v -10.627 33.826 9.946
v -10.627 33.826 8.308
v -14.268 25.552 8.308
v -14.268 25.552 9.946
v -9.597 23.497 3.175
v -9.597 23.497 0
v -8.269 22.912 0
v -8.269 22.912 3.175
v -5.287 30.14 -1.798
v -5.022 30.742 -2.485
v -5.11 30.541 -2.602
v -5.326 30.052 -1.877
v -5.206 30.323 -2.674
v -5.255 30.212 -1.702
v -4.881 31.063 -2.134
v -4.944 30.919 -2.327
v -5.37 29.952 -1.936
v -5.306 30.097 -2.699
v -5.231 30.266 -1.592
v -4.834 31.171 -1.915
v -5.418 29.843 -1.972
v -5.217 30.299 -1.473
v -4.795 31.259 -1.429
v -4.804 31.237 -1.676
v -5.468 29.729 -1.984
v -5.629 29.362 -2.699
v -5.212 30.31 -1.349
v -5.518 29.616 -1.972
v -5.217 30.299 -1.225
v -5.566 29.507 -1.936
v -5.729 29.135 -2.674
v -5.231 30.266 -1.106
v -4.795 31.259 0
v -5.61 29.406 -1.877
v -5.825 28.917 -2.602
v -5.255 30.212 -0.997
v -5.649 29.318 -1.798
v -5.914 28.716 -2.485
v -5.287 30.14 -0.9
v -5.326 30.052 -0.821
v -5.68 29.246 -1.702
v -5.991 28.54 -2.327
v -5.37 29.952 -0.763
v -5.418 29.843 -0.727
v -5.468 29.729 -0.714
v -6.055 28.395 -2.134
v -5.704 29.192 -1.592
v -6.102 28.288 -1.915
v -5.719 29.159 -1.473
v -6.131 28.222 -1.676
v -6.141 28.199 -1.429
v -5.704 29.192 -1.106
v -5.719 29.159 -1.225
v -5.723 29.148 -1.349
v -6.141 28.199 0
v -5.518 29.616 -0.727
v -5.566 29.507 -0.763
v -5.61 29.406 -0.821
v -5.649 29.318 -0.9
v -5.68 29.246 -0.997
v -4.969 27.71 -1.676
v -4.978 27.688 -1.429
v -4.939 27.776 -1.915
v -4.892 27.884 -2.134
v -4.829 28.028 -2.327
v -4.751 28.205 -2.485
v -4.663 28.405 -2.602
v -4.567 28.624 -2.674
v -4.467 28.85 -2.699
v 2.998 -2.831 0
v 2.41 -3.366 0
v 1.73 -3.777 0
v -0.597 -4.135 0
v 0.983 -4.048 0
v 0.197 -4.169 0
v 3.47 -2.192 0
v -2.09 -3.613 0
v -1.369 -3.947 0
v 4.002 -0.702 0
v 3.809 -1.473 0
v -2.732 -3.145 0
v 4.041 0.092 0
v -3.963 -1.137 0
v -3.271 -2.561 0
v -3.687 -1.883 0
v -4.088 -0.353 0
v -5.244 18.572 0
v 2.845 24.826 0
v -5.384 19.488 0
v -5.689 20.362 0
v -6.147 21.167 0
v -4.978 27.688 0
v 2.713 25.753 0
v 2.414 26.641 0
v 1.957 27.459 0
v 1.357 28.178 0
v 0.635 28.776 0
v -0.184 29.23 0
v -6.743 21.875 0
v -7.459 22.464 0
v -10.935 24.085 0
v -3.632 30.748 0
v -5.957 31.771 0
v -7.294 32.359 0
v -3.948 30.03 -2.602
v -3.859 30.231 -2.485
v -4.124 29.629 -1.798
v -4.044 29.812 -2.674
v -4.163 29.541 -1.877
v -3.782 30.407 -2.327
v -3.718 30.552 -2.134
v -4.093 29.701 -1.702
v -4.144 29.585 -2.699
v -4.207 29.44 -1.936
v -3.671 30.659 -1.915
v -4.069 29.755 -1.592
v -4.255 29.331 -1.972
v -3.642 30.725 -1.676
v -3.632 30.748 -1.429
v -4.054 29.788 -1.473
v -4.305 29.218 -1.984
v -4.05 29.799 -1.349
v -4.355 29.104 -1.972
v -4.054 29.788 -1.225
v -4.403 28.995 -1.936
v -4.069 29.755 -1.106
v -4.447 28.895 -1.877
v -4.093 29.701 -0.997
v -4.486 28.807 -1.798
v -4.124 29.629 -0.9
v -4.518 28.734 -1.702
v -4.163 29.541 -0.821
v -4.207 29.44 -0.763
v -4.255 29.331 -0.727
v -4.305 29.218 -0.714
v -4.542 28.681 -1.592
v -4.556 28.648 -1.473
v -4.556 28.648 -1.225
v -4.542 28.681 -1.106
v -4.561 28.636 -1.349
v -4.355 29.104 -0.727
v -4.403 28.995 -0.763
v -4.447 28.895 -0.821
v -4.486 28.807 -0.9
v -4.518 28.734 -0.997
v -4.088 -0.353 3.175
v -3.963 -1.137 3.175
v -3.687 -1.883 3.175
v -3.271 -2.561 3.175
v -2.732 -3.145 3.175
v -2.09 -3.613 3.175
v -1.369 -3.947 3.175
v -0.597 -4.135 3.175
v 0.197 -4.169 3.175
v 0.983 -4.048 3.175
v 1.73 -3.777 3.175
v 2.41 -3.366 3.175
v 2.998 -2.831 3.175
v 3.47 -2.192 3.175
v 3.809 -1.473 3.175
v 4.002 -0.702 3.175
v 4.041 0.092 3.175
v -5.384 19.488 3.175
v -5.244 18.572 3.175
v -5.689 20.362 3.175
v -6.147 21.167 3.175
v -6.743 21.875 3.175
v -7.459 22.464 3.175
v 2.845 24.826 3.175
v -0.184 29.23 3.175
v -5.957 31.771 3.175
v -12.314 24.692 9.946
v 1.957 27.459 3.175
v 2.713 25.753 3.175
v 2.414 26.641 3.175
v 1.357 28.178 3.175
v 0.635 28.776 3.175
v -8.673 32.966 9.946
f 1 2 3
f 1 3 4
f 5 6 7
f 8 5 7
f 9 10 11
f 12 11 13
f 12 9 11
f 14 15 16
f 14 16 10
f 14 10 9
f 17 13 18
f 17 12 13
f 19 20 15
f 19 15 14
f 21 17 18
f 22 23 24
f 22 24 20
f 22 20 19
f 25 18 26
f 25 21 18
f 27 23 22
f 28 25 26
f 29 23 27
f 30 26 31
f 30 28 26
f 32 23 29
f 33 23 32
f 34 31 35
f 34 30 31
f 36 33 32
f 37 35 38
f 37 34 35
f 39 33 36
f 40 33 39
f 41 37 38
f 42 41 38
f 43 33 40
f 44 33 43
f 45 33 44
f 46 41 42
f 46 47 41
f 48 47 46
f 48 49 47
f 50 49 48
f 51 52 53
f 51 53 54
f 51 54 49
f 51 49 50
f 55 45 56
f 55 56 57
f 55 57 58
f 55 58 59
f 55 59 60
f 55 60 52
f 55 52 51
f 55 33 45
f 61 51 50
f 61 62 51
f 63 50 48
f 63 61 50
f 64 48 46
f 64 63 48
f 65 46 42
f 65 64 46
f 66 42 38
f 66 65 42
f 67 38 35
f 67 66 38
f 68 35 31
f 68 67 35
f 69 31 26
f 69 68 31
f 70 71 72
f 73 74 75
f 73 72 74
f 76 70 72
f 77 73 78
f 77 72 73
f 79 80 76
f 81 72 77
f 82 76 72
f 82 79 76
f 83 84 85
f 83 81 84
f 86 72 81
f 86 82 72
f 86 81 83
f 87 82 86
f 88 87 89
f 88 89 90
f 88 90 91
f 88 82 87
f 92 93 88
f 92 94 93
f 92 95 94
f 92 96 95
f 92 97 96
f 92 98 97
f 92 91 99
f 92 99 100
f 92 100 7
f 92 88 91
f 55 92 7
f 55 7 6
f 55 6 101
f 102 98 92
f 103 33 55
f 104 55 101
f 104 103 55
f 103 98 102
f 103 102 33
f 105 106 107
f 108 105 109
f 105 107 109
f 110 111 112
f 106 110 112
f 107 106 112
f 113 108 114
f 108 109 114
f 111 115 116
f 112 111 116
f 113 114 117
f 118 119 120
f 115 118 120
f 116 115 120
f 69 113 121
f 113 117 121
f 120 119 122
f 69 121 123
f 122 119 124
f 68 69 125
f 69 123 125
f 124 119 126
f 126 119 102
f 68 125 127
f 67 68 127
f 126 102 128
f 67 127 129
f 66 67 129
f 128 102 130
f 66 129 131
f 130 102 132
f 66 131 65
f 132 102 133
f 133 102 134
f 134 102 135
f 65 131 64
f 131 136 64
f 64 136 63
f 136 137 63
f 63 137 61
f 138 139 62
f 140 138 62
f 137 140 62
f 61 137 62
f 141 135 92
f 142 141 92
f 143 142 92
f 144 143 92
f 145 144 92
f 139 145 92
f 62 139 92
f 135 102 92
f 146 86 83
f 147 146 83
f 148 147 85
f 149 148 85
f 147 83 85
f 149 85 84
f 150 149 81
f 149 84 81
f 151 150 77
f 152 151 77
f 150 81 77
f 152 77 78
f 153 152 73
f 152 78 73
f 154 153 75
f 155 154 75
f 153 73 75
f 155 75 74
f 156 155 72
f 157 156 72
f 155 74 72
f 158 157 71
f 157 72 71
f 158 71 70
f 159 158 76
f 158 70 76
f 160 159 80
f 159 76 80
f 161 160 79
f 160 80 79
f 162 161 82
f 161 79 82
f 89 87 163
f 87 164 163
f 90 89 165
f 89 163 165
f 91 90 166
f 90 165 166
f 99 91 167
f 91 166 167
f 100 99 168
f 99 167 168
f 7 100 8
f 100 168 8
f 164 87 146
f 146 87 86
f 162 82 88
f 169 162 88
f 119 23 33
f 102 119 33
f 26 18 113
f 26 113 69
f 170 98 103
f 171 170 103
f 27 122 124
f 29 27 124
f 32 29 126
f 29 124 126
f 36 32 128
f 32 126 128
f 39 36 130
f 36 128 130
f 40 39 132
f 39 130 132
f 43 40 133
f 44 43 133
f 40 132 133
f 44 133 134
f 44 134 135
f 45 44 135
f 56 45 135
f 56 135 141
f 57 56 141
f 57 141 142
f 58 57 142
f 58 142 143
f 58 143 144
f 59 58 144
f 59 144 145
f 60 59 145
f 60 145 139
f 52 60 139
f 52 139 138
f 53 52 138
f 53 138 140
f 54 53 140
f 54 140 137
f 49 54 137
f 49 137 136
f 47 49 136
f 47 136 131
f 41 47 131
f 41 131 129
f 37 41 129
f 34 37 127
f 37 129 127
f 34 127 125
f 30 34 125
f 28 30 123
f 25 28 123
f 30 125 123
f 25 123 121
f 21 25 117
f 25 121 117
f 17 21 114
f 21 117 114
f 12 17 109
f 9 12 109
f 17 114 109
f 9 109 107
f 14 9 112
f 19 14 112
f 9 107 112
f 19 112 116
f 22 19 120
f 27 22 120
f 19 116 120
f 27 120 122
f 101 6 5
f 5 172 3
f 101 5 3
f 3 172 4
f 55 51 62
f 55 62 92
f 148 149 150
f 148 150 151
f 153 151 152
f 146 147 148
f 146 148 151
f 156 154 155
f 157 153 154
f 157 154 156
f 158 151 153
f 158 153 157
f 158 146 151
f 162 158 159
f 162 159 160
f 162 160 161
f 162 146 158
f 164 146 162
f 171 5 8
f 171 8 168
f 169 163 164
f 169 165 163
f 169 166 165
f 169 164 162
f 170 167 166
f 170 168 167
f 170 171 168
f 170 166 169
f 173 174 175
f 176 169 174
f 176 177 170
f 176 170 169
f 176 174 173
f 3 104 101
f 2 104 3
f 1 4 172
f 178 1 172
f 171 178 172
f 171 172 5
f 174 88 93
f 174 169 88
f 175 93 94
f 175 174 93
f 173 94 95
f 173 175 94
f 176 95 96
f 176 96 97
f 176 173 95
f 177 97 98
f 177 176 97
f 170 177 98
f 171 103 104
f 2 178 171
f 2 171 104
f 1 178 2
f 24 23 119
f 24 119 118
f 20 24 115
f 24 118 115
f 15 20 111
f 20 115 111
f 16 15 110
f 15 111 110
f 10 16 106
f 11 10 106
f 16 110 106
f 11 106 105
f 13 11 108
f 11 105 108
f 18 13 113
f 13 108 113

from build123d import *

# Parameters (mm, degrees)
F1_DEPTH  = 3.175
F2_R      = 5.08
F3_R      = 5.08
F5_W      = 3.3427421004
F5_H      = 2.6986296289
F6_DEPTH  = 1.27
F7_R      = 1.27
F8_D      = 1.27
F10_DEPTH = 9.0390737111


with BuildPart() as f1:
    # F0 (on Top) → F1 (new body)
    with BuildSketch(Plane.XY):
        with BuildLine():
            Line((-5.9569855221, 31.7706279457), (-9.597370401, 23.4970282763))
            Line((-9.597370401, 23.4970282763), (-5.4328427644, 21.6646356006))
            Line((-5.4328427644, 21.6646356006), (-4.0882331564, -0.3526416028))
            ThreePointArc((-4.0882331564, -0.3526416028), (0.1973930726, -4.1691933566), (4.0409927589, 0.0921915022))
            Line((4.0409927589, 0.0921915022), (2.6926789221, 27.9647745192))
            Line((2.6926789221, 27.9647745192), (-5.9569855221, 31.7706279457))
        make_face()
    extrude(amount=F1_DEPTH)

    # F2
    f2_edges = [f1.edges().sort_by_distance(p)[0] for p in [
        (2.692679, 27.964775, 1.5875),
    ]]
    fillet(f2_edges, radius=F2_R)

    # F3
    f3_edges = [f1.edges().sort_by_distance(p)[0] for p in [
        (-5.432843, 21.664636, 1.5875),
    ]]
    fillet(f3_edges, radius=F3_R)

    # F5 (on offset) → F6 (join)
    with BuildSketch(Plane(origin=(-15.5400163929, 6.8376091371, 0), x_dir=(-0.4027387092, -0.9153149906, 0), z_dir=(-0.9153149906, 0.4027387092, 0))):
        with Locations((-25.0095250085, -1.3493148144)):
            Rectangle(F5_W, F5_H)
    extrude(amount=-F6_DEPTH)

    # F7
    f7_edges = [f1.edges().sort_by_distance(p)[0] for p in [
        (-4.213362, 31.003294, -2.69863),
        (-5.559613, 27.943632, -2.69863),
    ]]
    fillet(f7_edges, radius=F7_R)

    # F8 (through all)
    with Locations(Plane(origin=(-15.5400163929, 6.8376091371, 0), x_dir=(-0.4027387092, -0.9153149906, 0), z_dir=(-0.9153149906, 0.4027387092, 0))):
        with Locations((-25.0095250085, -1.3493148144)):
            Hole(F8_D / 2)

    # F9 (on face) → F10 (join, through all)
    with BuildSketch(Plane(origin=(10.745480909, 24.4215406479, 0), x_dir=(-0.9153149906, 0.4027387092, 0), z_dir=(0.4027387092, 0.9153149906, 0))):
        Polygon((21.2154332548, 9.9458275363), (18.2477798373, 3.175), (18.2477798373, 0), (19.7086434315, 0), (23.350128904, 8.3082040392), (23.350128904, 9.9458275363), align=None)
    extrude(amount=-F10_DEPTH)


solid = f1.part
